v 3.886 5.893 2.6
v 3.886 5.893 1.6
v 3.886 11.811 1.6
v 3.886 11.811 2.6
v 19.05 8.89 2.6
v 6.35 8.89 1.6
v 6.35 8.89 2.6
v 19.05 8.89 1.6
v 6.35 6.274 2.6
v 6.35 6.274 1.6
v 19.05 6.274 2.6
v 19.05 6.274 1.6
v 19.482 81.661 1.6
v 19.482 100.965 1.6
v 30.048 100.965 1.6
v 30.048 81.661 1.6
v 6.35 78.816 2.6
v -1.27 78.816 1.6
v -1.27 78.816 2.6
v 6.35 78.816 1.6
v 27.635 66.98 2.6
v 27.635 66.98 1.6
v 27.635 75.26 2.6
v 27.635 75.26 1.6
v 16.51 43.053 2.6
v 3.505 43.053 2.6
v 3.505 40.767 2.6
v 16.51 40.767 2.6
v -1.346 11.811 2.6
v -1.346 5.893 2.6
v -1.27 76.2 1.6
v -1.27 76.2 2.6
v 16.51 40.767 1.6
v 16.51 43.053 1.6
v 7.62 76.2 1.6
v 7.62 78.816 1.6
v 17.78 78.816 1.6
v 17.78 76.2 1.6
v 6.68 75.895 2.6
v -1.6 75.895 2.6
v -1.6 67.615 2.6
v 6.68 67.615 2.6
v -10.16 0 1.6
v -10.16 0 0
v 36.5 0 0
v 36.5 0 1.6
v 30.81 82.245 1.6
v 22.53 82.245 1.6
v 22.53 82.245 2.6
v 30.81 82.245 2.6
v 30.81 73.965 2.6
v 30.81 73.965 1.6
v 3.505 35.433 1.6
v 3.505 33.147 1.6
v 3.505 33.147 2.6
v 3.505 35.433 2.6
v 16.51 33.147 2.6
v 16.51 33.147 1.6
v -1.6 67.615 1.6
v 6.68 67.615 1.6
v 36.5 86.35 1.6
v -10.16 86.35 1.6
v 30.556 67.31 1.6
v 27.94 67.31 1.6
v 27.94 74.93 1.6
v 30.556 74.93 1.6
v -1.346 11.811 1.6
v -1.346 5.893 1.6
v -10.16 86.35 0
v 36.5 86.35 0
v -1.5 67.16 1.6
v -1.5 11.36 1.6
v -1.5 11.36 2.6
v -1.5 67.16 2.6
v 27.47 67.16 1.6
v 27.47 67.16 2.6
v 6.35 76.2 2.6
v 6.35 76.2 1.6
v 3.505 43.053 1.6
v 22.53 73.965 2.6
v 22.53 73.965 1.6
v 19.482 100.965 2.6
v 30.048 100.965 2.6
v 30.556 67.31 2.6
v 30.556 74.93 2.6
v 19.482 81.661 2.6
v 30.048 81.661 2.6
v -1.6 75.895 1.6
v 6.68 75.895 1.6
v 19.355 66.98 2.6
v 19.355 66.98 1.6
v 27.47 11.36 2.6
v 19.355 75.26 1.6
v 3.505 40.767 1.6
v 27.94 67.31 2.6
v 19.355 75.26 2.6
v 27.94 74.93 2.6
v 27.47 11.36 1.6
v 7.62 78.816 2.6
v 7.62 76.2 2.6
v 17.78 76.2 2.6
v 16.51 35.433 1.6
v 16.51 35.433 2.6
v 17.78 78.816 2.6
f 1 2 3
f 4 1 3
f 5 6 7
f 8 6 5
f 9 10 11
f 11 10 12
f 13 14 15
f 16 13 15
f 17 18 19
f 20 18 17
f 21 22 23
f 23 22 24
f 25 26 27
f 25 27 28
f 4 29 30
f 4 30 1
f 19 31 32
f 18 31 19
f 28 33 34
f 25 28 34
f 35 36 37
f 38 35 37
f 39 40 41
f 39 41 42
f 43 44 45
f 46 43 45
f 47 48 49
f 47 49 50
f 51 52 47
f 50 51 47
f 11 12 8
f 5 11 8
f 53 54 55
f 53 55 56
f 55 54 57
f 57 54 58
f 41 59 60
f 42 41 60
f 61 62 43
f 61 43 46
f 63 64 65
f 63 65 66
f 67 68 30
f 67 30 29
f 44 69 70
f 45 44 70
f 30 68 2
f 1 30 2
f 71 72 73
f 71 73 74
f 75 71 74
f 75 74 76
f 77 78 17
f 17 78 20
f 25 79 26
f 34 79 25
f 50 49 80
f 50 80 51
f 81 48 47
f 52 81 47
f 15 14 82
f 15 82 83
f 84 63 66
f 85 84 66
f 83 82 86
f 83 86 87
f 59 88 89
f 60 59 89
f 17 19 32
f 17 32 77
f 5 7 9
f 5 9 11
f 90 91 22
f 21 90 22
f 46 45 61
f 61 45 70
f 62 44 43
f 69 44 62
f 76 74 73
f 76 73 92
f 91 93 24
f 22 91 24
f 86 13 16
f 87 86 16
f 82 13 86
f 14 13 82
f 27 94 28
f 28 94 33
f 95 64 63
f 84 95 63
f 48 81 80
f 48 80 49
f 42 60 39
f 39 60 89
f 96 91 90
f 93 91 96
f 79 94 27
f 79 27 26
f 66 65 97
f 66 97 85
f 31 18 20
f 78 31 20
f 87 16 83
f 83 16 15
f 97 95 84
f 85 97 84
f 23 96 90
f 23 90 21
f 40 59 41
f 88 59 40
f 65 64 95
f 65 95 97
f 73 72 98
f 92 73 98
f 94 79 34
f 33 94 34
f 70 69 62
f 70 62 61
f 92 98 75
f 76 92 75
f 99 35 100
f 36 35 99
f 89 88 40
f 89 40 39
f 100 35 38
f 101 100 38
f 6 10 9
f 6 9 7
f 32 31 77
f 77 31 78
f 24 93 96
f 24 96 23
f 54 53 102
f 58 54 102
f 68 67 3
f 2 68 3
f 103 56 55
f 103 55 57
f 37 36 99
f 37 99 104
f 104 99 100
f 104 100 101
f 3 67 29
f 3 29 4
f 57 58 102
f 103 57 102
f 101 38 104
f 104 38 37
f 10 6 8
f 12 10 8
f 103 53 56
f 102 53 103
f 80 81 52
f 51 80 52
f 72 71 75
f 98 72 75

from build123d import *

# Parameters (mm, degrees)
SKETCH1_W                        = 46.66
SKETCH1_H                        = 86.35
BOARD_DEPTH                      = 1.6
SKETCH2_W                        = 8.2804
SKETCH2_H                        = 8.2804
EXTRUDE_E3_5_8_1_DEPTH           = 1
SKETCH3_W                        = 8.2804
SKETCH3_H                        = 8.2804
EXTRUDE_E3_5_8_2_DEPTH           = 1
SKETCH4_W                        = 8.2804
SKETCH4_H                        = 8.2804
EXTRUDE_E3_5_8_3_DEPTH           = 1
SKETCH5_W                        = 10.16
SKETCH5_H                        = 2.6162
DO41_10_1_DEPTH                  = 1
SKETCH6_W                        = 10.5664
SKETCH6_H                        = 19.304
TO220H_1_DEPTH                   = 1
SKETCH7_W                        = 5.2324
SKETCH7_H                        = 5.9182
DIL04_1_DEPTH                    = 1
SKETCH8_W                        = 13.0048
SKETCH8_H                        = 2.286
EXTRUDE_0207_12_1_DEPTH          = 1
SKETCH9_W                        = 13.0048
SKETCH9_H                        = 2.286
EXTRUDE_0207_12_2_DEPTH          = 1
SKETCH10_W                       = 2.6162
SKETCH10_H                       = 7.62
EXTRUDE_1X03_1_DEPTH             = 1
SKETCH11_W                       = 7.62
SKETCH11_H                       = 2.6162
EXTRUDE_1X03_2_DEPTH             = 1
SKETCH12_W                       = 12.7
SKETCH12_H                       = 2.6162
EXTRUDE_1X05_1_DEPTH             = 1
SKETCH13_W                       = 28.97
SKETCH13_H                       = 55.8
MODULE_ESP32_DEVKITC_32U_1_DEPTH = 1


with BuildPart() as part:
    # Sketch1 → BOARD (new body)
    with BuildSketch(Plane.XY):
        with Locations((13.17, 43.175)):
            Rectangle(SKETCH1_W, SKETCH1_H)
    extrude(amount=BOARD_DEPTH)


with BuildPart() as body_2:
    # Sketch2 → Extrude E3_5-8-1 (new body)
    with BuildSketch(Plane.XY.offset(1.6)):
        with Locations((2.54, 71.755)):
            Rectangle(SKETCH2_W, SKETCH2_H)
    extrude(amount=EXTRUDE_E3_5_8_1_DEPTH)


with BuildPart() as body_3:
    # Sketch3 → Extrude E3_5-8-2 (new body)
    with BuildSketch(Plane.XY.offset(1.6)):
        with Locations((26.67, 78.105)):
            Rectangle(SKETCH3_W, SKETCH3_H)
    extrude(amount=EXTRUDE_E3_5_8_2_DEPTH)


with BuildPart() as body_4:
    # Sketch4 → Extrude E3_5-8-3 (new body)
    with BuildSketch(Plane.XY.offset(1.6)):
        with Locations((23.495, 71.12)):
            Rectangle(SKETCH4_W, SKETCH4_H)
    extrude(amount=EXTRUDE_E3_5_8_3_DEPTH)


with BuildPart() as body_5:
    # Sketch5 → DO41-10-1 (new body)
    with BuildSketch(Plane.XY.offset(1.6)):
        with Locations((12.7, 77.5081)):
            Rectangle(SKETCH5_W, SKETCH5_H)
    extrude(amount=DO41_10_1_DEPTH)


with BuildPart() as body_6:
    # Sketch6 → TO220H-1 (new body)
    with BuildSketch(Plane.XY.offset(1.6)):
        with Locations((24.765, 91.313)):
            Rectangle(SKETCH6_W, SKETCH6_H)
    extrude(amount=TO220H_1_DEPTH)


with BuildPart() as body_7:
    # Sketch7 → DIL04-1 (new body)
    with BuildSketch(Plane.XY.offset(1.6)):
        with Locations((1.27, 8.8519)):
            Rectangle(SKETCH7_W, SKETCH7_H)
    extrude(amount=DIL04_1_DEPTH)


with BuildPart() as body_8:
    # Sketch8 → Extrude 0207_12-1 (new body)
    with BuildSketch(Plane.XY.offset(1.6)):
        with Locations((10.0076, 34.29)):
            Rectangle(SKETCH8_W, SKETCH8_H)
    extrude(amount=EXTRUDE_0207_12_1_DEPTH)


with BuildPart() as body_9:
    # Sketch9 → Extrude 0207_12-2 (new body)
    with BuildSketch(Plane.XY.offset(1.6)):
        with Locations((10.0076, 41.91)):
            Rectangle(SKETCH9_W, SKETCH9_H)
    extrude(amount=EXTRUDE_0207_12_2_DEPTH)


with BuildPart() as body_10:
    # Sketch10 → Extrude 1X03-1 (new body)
    with BuildSketch(Plane.XY.offset(1.6)):
        with Locations((29.2481, 71.12)):
            Rectangle(SKETCH10_W, SKETCH10_H)
    extrude(amount=EXTRUDE_1X03_1_DEPTH)


with BuildPart() as body_11:
    # Sketch11 → Extrude 1X03-2 (new body)
    with BuildSketch(Plane.XY.offset(1.6)):
        with Locations((2.54, 77.5081)):
            Rectangle(SKETCH11_W, SKETCH11_H)
    extrude(amount=EXTRUDE_1X03_2_DEPTH)


with BuildPart() as body_12:
    # Sketch12 → Extrude 1X05-1 (new body)
    with BuildSketch(Plane.XY.offset(1.6)):
        with Locations((12.7, 7.5819)):
            Rectangle(SKETCH12_W, SKETCH12_H)
    extrude(amount=EXTRUDE_1X05_1_DEPTH)


with BuildPart() as body_13:
    # Sketch13 → MODULE_ESP32-DEVKITC-32U-1 (new body)
    with BuildSketch(Plane.XY.offset(1.6)):
        with Locations((12.985, 39.26)):
            Rectangle(SKETCH13_W, SKETCH13_H)
    extrude(amount=MODULE_ESP32_DEVKITC_32U_1_DEPTH)


solid = Compound([part.part, body_2.part, body_3.part, body_4.part, body_5.part, body_6.part, body_7.part, body_8.part, body_9.part, body_10.part, body_11.part, body_12.part, body_13.part])
